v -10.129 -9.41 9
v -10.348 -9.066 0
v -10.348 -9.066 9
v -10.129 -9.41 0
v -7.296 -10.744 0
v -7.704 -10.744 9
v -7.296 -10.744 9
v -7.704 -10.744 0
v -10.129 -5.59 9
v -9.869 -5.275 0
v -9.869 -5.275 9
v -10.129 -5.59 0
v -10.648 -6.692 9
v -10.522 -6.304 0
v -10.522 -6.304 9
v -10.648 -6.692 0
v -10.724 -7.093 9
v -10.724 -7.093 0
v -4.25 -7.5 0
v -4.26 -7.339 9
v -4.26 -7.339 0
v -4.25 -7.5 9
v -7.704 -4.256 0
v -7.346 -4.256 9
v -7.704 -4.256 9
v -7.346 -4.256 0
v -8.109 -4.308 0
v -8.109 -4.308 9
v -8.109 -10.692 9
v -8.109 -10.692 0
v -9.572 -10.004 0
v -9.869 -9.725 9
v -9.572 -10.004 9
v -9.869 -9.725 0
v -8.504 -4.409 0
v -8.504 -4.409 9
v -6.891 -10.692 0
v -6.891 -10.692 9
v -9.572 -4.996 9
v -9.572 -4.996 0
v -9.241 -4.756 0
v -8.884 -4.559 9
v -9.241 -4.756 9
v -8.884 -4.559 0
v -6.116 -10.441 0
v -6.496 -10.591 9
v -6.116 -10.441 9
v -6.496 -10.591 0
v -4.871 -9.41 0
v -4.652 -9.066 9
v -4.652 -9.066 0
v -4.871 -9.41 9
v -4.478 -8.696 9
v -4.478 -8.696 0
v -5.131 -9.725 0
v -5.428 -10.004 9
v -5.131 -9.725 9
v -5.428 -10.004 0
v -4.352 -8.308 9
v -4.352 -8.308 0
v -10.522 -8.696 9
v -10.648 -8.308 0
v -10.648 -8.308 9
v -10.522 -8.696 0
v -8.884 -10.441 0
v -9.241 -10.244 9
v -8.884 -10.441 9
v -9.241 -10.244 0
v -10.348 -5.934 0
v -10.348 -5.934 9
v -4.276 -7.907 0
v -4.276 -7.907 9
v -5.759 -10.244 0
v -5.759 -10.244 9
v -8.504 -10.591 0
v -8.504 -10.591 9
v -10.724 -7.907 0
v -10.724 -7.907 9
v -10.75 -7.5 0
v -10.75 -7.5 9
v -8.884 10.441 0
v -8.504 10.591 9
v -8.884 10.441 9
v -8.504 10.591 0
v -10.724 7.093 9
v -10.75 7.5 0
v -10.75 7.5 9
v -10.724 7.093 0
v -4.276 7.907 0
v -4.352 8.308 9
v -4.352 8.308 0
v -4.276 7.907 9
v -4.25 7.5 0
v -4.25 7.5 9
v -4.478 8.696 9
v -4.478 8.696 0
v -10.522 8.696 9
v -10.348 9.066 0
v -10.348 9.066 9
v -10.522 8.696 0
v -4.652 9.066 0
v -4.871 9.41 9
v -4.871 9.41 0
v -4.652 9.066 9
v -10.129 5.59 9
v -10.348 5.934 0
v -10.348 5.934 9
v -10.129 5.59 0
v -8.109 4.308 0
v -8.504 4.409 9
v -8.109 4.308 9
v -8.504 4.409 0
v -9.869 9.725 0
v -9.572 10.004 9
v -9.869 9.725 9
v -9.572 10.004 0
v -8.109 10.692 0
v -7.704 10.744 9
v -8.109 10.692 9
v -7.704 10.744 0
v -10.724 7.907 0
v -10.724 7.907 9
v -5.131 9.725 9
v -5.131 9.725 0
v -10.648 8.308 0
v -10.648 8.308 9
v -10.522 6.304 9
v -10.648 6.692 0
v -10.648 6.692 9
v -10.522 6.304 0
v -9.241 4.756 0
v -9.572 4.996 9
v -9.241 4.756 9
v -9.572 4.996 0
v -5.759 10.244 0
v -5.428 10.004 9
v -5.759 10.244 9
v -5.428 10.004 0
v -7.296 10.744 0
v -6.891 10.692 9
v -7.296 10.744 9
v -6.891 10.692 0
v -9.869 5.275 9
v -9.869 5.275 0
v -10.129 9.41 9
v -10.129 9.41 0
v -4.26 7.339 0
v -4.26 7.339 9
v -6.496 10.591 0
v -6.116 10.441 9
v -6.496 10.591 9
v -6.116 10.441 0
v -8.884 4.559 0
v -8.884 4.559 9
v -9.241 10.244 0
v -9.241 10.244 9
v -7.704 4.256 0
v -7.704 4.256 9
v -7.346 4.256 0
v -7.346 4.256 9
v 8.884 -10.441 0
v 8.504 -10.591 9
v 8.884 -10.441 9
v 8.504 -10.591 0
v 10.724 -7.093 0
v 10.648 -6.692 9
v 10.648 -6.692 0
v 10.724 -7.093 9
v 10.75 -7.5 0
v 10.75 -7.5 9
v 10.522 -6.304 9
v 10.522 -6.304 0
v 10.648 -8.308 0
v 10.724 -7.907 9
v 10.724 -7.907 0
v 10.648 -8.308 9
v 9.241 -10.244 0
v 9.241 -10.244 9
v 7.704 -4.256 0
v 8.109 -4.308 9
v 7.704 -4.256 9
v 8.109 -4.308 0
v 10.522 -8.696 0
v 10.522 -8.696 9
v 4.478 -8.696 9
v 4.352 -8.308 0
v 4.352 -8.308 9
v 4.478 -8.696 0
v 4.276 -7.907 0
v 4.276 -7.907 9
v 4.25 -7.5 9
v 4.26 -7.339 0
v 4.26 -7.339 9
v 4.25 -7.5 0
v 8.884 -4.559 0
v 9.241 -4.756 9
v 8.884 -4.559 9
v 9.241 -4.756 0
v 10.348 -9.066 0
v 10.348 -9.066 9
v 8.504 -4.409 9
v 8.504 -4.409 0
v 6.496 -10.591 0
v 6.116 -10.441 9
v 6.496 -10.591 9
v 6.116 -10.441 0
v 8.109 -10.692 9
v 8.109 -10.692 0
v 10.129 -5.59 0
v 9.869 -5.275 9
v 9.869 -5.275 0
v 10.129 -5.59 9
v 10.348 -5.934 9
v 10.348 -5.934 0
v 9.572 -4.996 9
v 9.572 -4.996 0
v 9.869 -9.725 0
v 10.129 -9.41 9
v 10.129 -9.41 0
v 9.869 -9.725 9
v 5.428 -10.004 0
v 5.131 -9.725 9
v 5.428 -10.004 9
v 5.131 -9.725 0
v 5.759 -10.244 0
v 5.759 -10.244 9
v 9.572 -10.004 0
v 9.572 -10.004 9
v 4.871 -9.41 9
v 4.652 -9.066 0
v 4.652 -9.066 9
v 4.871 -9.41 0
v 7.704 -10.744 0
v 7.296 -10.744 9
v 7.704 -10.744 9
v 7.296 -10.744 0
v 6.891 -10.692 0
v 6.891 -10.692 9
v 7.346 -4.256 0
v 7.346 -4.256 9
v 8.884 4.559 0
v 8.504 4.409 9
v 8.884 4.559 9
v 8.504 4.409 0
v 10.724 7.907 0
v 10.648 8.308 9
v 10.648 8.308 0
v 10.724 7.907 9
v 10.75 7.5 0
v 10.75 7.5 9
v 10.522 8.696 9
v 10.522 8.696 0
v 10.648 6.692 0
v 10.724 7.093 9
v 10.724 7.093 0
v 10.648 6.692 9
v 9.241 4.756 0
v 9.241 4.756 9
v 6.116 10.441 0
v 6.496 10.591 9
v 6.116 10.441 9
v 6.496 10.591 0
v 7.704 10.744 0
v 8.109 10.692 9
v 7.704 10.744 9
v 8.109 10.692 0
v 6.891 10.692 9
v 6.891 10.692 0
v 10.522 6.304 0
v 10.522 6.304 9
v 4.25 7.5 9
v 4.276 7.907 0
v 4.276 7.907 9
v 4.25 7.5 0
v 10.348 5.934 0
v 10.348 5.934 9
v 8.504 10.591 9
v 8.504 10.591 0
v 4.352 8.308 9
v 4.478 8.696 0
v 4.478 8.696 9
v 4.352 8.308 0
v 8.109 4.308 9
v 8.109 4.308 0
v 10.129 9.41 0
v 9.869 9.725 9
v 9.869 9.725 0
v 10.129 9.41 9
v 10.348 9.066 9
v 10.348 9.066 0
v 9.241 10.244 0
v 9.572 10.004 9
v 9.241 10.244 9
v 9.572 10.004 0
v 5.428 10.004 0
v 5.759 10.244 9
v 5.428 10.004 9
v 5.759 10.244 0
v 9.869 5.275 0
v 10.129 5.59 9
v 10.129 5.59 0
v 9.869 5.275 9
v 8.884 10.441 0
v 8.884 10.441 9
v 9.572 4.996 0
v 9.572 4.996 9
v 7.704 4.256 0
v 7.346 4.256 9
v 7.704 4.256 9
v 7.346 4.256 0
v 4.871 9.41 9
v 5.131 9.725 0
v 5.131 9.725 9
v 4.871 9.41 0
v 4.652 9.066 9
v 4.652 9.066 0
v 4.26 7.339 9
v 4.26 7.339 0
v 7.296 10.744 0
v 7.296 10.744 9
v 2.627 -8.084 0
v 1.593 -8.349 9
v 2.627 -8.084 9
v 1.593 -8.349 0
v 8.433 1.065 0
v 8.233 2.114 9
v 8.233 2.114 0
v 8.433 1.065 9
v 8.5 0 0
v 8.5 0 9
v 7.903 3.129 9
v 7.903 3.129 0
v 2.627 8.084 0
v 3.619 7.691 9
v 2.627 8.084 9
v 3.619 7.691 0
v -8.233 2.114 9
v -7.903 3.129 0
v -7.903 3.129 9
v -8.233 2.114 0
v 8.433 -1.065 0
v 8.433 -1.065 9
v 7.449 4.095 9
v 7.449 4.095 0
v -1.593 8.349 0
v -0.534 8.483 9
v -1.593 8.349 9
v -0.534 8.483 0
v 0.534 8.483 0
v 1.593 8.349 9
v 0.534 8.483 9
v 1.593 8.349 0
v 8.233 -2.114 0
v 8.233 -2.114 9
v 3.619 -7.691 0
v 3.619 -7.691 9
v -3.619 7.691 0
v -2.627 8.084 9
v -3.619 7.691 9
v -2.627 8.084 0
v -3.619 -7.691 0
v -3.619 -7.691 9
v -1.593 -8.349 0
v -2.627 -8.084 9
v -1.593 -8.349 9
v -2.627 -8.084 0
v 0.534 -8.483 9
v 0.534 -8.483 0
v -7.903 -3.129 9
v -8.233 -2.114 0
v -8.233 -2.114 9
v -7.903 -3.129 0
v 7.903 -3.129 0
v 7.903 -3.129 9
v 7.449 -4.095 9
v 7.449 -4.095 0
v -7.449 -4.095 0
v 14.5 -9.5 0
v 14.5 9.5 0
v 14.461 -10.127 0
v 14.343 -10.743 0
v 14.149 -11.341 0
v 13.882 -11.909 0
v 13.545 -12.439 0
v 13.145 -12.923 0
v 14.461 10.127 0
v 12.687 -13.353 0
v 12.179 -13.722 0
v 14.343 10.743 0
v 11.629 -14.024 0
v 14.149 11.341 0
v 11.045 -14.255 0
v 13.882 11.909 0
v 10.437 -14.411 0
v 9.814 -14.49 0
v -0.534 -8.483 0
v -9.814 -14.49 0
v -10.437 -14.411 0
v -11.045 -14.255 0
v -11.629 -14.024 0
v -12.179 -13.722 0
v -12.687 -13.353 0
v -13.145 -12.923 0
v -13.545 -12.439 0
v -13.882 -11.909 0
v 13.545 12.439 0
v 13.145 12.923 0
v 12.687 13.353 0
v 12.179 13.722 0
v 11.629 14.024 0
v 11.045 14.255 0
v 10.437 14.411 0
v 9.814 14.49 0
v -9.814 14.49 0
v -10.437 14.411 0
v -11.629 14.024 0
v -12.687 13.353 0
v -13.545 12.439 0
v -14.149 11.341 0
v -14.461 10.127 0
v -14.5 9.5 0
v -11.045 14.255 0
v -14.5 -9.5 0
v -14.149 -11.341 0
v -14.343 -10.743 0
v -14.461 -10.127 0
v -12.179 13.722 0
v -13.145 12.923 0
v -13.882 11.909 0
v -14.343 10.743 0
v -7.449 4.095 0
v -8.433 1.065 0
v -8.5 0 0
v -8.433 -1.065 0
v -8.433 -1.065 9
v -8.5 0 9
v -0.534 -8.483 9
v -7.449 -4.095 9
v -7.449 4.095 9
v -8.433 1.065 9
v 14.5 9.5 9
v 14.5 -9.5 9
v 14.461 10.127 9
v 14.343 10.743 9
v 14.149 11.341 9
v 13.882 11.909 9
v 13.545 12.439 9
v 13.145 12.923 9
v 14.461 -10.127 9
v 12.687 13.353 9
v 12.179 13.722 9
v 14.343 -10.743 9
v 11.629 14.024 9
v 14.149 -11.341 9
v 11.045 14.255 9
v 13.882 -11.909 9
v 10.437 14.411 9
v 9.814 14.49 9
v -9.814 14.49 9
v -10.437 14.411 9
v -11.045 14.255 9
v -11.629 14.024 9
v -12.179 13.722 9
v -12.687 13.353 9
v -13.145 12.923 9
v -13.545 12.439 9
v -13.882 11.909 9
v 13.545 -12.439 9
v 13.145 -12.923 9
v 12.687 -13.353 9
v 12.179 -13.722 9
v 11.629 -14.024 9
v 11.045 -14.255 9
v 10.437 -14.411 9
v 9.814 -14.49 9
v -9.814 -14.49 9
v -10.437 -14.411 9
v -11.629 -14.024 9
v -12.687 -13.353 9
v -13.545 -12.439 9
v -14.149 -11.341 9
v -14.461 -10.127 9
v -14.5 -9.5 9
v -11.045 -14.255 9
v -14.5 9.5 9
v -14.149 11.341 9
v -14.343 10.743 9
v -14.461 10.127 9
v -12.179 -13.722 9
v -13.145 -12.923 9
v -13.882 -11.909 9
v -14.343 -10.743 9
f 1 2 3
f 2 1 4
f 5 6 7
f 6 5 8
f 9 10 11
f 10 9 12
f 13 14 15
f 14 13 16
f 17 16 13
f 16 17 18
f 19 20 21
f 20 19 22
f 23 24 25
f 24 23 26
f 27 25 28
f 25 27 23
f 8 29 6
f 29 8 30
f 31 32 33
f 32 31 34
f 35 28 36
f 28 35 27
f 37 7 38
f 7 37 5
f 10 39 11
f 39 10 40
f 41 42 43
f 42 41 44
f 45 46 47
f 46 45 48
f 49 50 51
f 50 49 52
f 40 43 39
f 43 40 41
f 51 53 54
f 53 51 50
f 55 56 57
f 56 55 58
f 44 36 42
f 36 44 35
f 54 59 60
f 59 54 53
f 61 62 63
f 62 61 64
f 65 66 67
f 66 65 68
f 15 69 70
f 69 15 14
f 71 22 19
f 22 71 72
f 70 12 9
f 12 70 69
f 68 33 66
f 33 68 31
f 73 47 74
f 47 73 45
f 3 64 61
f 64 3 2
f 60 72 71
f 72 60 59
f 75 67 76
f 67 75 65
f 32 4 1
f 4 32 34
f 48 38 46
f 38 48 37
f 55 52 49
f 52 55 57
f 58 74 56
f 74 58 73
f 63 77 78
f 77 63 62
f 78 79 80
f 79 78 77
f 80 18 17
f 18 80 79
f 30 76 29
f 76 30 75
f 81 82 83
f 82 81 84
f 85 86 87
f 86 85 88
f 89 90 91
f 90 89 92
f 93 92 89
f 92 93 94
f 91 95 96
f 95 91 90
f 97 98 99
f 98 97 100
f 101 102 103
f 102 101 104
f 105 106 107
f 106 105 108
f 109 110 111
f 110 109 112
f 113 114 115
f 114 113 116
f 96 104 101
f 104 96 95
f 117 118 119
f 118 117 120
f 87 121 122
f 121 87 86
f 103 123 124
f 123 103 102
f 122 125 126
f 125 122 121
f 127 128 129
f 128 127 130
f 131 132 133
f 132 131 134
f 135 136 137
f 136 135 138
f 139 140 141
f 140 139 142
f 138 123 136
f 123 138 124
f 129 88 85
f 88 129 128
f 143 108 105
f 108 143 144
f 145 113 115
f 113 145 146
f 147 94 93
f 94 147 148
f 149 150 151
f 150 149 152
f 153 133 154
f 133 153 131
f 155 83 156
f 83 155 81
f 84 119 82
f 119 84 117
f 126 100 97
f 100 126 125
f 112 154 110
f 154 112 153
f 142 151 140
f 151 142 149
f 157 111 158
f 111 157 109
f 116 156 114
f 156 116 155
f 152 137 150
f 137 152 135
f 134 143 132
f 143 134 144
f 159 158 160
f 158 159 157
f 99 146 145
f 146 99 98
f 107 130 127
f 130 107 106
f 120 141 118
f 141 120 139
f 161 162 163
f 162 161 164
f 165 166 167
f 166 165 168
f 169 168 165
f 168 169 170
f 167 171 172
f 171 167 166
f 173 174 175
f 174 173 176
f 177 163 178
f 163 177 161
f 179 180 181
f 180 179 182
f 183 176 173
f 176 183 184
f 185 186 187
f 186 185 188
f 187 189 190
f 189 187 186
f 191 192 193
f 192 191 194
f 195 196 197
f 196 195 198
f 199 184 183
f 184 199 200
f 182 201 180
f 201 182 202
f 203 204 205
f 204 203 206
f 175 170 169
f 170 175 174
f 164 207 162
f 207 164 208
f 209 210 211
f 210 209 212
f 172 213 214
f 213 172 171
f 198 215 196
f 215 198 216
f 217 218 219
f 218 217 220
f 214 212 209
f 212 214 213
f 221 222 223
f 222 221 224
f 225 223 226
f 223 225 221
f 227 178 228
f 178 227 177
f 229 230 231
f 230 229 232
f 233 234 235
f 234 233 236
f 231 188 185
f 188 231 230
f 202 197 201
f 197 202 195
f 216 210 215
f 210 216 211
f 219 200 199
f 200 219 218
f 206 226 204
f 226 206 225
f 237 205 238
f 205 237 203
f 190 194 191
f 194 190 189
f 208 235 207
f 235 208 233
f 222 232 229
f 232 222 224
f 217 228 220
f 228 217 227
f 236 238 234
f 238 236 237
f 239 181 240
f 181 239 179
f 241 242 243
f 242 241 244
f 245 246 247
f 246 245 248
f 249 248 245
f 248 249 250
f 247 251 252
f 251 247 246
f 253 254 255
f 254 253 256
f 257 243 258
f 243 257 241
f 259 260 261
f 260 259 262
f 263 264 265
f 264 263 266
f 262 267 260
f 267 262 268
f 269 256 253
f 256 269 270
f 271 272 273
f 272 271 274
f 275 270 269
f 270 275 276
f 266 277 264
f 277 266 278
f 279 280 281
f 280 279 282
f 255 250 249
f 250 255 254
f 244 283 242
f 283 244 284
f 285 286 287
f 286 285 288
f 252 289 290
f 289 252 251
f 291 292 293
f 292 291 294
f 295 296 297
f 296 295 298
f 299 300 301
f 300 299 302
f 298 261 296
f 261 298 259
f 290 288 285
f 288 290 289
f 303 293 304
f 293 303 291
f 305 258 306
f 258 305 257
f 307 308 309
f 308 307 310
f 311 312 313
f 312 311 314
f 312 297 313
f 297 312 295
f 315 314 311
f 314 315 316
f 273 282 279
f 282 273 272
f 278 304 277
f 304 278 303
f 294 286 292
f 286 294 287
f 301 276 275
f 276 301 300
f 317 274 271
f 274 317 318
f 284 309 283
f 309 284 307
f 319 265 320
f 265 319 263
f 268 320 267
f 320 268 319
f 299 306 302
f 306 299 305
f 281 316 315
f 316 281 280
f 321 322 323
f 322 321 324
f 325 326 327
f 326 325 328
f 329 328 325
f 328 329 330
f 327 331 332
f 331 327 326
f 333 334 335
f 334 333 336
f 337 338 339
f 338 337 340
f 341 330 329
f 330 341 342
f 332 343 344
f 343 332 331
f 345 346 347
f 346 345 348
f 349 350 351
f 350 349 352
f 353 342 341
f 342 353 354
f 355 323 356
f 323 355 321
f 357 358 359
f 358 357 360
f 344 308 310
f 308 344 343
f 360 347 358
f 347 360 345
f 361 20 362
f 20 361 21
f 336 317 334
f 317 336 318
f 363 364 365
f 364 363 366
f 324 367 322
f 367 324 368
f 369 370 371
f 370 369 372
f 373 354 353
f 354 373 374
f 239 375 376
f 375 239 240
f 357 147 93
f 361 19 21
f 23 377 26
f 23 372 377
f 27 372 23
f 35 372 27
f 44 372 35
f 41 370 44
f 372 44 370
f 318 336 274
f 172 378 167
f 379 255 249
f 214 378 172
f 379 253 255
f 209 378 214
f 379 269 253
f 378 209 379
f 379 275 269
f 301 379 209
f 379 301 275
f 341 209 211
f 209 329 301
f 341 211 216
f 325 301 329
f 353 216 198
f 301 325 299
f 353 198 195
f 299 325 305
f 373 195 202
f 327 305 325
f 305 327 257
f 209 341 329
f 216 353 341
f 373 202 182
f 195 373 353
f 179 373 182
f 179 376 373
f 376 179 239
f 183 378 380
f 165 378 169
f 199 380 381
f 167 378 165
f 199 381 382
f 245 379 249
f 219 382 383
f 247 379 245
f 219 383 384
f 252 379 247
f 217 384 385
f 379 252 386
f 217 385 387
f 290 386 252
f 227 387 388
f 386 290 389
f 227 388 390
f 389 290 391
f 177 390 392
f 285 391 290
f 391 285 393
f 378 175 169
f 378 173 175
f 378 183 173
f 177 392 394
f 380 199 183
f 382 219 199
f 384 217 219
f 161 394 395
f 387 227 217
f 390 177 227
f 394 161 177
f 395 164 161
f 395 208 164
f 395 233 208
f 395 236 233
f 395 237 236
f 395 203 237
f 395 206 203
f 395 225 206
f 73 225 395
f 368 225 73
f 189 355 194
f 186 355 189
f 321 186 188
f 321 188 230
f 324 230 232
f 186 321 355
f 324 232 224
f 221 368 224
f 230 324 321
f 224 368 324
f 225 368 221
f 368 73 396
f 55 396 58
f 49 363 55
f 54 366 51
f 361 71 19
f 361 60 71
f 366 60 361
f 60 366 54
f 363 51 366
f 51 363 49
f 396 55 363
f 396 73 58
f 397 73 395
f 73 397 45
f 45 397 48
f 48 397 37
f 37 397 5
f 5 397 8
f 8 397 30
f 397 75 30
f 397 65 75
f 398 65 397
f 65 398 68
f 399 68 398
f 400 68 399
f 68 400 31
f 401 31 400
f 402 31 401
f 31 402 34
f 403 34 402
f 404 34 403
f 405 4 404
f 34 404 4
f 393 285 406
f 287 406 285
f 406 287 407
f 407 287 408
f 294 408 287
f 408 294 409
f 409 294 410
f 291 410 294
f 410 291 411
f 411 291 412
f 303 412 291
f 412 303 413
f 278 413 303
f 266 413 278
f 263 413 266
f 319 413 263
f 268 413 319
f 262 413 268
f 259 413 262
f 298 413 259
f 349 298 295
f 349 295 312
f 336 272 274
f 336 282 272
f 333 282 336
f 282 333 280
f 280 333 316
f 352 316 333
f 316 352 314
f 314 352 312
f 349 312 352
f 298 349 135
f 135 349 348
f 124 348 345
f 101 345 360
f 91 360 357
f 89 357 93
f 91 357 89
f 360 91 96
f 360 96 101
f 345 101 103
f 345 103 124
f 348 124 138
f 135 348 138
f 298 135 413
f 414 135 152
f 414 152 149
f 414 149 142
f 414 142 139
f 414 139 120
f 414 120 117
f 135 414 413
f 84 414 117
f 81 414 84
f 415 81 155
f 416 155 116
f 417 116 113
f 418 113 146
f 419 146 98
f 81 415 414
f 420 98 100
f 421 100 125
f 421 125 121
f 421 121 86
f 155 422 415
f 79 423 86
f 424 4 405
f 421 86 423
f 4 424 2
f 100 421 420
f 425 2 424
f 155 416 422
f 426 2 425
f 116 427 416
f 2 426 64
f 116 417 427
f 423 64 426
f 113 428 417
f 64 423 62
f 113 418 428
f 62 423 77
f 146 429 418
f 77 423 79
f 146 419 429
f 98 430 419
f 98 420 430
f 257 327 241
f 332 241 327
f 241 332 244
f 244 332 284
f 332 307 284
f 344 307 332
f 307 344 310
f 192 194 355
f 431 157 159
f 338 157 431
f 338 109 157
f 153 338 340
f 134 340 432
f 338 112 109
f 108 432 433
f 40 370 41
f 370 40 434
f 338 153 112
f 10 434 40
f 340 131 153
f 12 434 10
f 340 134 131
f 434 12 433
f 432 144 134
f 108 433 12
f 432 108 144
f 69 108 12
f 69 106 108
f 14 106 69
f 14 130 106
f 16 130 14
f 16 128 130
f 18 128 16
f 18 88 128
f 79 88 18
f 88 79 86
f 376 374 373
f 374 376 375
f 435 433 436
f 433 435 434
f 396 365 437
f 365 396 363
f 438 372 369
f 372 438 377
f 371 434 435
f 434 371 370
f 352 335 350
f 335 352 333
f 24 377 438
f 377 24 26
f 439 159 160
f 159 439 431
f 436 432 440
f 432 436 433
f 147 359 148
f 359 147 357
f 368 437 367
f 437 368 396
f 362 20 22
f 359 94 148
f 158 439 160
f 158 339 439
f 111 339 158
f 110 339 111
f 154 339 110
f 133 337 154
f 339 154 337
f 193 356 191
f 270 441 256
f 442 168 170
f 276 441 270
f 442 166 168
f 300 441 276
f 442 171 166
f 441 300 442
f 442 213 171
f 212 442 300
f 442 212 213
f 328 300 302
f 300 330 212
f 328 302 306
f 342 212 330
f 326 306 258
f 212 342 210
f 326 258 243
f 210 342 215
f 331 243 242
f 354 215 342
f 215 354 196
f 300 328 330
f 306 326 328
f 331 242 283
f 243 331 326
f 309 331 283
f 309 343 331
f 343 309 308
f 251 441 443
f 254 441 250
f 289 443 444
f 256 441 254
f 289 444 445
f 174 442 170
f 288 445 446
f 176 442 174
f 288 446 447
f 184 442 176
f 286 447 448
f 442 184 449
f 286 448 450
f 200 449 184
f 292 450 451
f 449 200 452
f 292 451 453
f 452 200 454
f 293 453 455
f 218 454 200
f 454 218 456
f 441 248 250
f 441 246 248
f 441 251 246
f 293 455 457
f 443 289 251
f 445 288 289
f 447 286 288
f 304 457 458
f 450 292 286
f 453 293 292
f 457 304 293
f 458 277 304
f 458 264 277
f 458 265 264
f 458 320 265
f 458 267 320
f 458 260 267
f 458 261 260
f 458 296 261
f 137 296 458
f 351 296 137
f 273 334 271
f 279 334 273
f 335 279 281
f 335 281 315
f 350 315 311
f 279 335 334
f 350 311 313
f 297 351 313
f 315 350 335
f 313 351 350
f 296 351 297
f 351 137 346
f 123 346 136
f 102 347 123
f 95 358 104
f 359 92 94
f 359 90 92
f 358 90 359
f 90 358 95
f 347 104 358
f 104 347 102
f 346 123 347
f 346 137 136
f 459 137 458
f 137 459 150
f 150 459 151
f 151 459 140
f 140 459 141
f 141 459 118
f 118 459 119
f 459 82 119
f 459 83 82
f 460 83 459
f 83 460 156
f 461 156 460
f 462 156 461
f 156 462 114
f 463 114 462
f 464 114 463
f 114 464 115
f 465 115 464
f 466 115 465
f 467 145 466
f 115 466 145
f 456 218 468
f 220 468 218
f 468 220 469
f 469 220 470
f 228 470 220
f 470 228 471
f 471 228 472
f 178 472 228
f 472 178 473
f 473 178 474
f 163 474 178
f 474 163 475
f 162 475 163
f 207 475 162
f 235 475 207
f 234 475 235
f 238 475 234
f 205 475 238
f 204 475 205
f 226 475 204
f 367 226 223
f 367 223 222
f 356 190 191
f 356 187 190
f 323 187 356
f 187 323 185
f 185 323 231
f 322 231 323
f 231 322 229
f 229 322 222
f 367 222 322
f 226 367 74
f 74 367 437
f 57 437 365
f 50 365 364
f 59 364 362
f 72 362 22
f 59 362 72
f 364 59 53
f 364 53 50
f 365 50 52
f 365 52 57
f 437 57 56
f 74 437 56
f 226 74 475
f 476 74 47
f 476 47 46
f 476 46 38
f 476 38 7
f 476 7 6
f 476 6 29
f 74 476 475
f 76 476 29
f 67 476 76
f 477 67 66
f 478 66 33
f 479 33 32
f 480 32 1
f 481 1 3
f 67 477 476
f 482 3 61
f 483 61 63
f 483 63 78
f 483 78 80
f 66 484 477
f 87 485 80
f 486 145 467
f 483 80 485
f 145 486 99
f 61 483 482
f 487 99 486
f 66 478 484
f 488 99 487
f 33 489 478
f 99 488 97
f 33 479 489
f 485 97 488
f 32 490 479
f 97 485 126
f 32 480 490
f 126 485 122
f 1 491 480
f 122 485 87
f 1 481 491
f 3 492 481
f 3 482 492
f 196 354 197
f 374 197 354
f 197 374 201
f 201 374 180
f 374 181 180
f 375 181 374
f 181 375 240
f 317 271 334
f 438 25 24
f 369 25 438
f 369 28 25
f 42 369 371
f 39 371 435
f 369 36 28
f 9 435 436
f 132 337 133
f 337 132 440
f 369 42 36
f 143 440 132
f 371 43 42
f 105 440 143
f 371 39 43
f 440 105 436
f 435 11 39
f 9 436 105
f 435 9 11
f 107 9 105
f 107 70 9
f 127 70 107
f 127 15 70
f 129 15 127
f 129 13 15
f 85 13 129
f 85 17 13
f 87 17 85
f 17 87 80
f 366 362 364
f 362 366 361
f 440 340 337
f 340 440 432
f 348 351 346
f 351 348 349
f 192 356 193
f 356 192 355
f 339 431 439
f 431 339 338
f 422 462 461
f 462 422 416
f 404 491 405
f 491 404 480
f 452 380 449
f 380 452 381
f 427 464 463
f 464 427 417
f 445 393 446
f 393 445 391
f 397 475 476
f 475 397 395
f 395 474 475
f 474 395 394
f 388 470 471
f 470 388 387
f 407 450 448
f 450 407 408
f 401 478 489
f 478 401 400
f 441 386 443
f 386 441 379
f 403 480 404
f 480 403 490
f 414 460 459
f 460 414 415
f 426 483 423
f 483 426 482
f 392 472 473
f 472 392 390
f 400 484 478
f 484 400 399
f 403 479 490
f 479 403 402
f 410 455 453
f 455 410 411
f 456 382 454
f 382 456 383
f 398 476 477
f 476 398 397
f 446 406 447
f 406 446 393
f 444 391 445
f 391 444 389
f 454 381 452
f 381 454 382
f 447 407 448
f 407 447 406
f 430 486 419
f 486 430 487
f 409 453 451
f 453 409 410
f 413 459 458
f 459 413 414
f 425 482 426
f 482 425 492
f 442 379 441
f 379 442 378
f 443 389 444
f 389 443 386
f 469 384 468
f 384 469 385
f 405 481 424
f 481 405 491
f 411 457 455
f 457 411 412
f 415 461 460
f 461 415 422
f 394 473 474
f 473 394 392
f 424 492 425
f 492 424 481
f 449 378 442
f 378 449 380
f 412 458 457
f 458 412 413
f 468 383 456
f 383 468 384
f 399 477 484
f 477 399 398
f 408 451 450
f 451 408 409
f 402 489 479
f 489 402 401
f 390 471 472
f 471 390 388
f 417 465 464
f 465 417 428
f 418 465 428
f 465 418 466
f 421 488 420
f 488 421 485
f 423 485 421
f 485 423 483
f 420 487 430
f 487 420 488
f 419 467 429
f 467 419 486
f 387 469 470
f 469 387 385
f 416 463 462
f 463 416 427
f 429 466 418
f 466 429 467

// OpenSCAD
$fn = 50;


difference() {
	union() {
		hull() {
			translate(v = [-9.5000000000, 9.5000000000, 0]) {
				cylinder(h = 9, r = 5);
			}
			translate(v = [9.5000000000, 9.5000000000, 0]) {
				cylinder(h = 9, r = 5);
			}
			translate(v = [-9.5000000000, -9.5000000000, 0]) {
				cylinder(h = 9, r = 5);
			}
			translate(v = [9.5000000000, -9.5000000000, 0]) {
				cylinder(h = 9, r = 5);
			}
		}
	}
	union() {
		#translate(v = [-7.5000000000, -7.5000000000, -100.0000000000]) {
			cylinder(h = 200, r = 3.2500000000);
		}
		#translate(v = [-7.5000000000, 7.5000000000, -100.0000000000]) {
			cylinder(h = 200, r = 3.2500000000);
		}
		#translate(v = [7.5000000000, -7.5000000000, -100.0000000000]) {
			cylinder(h = 200, r = 3.2500000000);
		}
		#translate(v = [7.5000000000, 7.5000000000, -100.0000000000]) {
			cylinder(h = 200, r = 3.2500000000);
		}
		#cylinder(h = 9, r = 8.5000000000);
	}
}
